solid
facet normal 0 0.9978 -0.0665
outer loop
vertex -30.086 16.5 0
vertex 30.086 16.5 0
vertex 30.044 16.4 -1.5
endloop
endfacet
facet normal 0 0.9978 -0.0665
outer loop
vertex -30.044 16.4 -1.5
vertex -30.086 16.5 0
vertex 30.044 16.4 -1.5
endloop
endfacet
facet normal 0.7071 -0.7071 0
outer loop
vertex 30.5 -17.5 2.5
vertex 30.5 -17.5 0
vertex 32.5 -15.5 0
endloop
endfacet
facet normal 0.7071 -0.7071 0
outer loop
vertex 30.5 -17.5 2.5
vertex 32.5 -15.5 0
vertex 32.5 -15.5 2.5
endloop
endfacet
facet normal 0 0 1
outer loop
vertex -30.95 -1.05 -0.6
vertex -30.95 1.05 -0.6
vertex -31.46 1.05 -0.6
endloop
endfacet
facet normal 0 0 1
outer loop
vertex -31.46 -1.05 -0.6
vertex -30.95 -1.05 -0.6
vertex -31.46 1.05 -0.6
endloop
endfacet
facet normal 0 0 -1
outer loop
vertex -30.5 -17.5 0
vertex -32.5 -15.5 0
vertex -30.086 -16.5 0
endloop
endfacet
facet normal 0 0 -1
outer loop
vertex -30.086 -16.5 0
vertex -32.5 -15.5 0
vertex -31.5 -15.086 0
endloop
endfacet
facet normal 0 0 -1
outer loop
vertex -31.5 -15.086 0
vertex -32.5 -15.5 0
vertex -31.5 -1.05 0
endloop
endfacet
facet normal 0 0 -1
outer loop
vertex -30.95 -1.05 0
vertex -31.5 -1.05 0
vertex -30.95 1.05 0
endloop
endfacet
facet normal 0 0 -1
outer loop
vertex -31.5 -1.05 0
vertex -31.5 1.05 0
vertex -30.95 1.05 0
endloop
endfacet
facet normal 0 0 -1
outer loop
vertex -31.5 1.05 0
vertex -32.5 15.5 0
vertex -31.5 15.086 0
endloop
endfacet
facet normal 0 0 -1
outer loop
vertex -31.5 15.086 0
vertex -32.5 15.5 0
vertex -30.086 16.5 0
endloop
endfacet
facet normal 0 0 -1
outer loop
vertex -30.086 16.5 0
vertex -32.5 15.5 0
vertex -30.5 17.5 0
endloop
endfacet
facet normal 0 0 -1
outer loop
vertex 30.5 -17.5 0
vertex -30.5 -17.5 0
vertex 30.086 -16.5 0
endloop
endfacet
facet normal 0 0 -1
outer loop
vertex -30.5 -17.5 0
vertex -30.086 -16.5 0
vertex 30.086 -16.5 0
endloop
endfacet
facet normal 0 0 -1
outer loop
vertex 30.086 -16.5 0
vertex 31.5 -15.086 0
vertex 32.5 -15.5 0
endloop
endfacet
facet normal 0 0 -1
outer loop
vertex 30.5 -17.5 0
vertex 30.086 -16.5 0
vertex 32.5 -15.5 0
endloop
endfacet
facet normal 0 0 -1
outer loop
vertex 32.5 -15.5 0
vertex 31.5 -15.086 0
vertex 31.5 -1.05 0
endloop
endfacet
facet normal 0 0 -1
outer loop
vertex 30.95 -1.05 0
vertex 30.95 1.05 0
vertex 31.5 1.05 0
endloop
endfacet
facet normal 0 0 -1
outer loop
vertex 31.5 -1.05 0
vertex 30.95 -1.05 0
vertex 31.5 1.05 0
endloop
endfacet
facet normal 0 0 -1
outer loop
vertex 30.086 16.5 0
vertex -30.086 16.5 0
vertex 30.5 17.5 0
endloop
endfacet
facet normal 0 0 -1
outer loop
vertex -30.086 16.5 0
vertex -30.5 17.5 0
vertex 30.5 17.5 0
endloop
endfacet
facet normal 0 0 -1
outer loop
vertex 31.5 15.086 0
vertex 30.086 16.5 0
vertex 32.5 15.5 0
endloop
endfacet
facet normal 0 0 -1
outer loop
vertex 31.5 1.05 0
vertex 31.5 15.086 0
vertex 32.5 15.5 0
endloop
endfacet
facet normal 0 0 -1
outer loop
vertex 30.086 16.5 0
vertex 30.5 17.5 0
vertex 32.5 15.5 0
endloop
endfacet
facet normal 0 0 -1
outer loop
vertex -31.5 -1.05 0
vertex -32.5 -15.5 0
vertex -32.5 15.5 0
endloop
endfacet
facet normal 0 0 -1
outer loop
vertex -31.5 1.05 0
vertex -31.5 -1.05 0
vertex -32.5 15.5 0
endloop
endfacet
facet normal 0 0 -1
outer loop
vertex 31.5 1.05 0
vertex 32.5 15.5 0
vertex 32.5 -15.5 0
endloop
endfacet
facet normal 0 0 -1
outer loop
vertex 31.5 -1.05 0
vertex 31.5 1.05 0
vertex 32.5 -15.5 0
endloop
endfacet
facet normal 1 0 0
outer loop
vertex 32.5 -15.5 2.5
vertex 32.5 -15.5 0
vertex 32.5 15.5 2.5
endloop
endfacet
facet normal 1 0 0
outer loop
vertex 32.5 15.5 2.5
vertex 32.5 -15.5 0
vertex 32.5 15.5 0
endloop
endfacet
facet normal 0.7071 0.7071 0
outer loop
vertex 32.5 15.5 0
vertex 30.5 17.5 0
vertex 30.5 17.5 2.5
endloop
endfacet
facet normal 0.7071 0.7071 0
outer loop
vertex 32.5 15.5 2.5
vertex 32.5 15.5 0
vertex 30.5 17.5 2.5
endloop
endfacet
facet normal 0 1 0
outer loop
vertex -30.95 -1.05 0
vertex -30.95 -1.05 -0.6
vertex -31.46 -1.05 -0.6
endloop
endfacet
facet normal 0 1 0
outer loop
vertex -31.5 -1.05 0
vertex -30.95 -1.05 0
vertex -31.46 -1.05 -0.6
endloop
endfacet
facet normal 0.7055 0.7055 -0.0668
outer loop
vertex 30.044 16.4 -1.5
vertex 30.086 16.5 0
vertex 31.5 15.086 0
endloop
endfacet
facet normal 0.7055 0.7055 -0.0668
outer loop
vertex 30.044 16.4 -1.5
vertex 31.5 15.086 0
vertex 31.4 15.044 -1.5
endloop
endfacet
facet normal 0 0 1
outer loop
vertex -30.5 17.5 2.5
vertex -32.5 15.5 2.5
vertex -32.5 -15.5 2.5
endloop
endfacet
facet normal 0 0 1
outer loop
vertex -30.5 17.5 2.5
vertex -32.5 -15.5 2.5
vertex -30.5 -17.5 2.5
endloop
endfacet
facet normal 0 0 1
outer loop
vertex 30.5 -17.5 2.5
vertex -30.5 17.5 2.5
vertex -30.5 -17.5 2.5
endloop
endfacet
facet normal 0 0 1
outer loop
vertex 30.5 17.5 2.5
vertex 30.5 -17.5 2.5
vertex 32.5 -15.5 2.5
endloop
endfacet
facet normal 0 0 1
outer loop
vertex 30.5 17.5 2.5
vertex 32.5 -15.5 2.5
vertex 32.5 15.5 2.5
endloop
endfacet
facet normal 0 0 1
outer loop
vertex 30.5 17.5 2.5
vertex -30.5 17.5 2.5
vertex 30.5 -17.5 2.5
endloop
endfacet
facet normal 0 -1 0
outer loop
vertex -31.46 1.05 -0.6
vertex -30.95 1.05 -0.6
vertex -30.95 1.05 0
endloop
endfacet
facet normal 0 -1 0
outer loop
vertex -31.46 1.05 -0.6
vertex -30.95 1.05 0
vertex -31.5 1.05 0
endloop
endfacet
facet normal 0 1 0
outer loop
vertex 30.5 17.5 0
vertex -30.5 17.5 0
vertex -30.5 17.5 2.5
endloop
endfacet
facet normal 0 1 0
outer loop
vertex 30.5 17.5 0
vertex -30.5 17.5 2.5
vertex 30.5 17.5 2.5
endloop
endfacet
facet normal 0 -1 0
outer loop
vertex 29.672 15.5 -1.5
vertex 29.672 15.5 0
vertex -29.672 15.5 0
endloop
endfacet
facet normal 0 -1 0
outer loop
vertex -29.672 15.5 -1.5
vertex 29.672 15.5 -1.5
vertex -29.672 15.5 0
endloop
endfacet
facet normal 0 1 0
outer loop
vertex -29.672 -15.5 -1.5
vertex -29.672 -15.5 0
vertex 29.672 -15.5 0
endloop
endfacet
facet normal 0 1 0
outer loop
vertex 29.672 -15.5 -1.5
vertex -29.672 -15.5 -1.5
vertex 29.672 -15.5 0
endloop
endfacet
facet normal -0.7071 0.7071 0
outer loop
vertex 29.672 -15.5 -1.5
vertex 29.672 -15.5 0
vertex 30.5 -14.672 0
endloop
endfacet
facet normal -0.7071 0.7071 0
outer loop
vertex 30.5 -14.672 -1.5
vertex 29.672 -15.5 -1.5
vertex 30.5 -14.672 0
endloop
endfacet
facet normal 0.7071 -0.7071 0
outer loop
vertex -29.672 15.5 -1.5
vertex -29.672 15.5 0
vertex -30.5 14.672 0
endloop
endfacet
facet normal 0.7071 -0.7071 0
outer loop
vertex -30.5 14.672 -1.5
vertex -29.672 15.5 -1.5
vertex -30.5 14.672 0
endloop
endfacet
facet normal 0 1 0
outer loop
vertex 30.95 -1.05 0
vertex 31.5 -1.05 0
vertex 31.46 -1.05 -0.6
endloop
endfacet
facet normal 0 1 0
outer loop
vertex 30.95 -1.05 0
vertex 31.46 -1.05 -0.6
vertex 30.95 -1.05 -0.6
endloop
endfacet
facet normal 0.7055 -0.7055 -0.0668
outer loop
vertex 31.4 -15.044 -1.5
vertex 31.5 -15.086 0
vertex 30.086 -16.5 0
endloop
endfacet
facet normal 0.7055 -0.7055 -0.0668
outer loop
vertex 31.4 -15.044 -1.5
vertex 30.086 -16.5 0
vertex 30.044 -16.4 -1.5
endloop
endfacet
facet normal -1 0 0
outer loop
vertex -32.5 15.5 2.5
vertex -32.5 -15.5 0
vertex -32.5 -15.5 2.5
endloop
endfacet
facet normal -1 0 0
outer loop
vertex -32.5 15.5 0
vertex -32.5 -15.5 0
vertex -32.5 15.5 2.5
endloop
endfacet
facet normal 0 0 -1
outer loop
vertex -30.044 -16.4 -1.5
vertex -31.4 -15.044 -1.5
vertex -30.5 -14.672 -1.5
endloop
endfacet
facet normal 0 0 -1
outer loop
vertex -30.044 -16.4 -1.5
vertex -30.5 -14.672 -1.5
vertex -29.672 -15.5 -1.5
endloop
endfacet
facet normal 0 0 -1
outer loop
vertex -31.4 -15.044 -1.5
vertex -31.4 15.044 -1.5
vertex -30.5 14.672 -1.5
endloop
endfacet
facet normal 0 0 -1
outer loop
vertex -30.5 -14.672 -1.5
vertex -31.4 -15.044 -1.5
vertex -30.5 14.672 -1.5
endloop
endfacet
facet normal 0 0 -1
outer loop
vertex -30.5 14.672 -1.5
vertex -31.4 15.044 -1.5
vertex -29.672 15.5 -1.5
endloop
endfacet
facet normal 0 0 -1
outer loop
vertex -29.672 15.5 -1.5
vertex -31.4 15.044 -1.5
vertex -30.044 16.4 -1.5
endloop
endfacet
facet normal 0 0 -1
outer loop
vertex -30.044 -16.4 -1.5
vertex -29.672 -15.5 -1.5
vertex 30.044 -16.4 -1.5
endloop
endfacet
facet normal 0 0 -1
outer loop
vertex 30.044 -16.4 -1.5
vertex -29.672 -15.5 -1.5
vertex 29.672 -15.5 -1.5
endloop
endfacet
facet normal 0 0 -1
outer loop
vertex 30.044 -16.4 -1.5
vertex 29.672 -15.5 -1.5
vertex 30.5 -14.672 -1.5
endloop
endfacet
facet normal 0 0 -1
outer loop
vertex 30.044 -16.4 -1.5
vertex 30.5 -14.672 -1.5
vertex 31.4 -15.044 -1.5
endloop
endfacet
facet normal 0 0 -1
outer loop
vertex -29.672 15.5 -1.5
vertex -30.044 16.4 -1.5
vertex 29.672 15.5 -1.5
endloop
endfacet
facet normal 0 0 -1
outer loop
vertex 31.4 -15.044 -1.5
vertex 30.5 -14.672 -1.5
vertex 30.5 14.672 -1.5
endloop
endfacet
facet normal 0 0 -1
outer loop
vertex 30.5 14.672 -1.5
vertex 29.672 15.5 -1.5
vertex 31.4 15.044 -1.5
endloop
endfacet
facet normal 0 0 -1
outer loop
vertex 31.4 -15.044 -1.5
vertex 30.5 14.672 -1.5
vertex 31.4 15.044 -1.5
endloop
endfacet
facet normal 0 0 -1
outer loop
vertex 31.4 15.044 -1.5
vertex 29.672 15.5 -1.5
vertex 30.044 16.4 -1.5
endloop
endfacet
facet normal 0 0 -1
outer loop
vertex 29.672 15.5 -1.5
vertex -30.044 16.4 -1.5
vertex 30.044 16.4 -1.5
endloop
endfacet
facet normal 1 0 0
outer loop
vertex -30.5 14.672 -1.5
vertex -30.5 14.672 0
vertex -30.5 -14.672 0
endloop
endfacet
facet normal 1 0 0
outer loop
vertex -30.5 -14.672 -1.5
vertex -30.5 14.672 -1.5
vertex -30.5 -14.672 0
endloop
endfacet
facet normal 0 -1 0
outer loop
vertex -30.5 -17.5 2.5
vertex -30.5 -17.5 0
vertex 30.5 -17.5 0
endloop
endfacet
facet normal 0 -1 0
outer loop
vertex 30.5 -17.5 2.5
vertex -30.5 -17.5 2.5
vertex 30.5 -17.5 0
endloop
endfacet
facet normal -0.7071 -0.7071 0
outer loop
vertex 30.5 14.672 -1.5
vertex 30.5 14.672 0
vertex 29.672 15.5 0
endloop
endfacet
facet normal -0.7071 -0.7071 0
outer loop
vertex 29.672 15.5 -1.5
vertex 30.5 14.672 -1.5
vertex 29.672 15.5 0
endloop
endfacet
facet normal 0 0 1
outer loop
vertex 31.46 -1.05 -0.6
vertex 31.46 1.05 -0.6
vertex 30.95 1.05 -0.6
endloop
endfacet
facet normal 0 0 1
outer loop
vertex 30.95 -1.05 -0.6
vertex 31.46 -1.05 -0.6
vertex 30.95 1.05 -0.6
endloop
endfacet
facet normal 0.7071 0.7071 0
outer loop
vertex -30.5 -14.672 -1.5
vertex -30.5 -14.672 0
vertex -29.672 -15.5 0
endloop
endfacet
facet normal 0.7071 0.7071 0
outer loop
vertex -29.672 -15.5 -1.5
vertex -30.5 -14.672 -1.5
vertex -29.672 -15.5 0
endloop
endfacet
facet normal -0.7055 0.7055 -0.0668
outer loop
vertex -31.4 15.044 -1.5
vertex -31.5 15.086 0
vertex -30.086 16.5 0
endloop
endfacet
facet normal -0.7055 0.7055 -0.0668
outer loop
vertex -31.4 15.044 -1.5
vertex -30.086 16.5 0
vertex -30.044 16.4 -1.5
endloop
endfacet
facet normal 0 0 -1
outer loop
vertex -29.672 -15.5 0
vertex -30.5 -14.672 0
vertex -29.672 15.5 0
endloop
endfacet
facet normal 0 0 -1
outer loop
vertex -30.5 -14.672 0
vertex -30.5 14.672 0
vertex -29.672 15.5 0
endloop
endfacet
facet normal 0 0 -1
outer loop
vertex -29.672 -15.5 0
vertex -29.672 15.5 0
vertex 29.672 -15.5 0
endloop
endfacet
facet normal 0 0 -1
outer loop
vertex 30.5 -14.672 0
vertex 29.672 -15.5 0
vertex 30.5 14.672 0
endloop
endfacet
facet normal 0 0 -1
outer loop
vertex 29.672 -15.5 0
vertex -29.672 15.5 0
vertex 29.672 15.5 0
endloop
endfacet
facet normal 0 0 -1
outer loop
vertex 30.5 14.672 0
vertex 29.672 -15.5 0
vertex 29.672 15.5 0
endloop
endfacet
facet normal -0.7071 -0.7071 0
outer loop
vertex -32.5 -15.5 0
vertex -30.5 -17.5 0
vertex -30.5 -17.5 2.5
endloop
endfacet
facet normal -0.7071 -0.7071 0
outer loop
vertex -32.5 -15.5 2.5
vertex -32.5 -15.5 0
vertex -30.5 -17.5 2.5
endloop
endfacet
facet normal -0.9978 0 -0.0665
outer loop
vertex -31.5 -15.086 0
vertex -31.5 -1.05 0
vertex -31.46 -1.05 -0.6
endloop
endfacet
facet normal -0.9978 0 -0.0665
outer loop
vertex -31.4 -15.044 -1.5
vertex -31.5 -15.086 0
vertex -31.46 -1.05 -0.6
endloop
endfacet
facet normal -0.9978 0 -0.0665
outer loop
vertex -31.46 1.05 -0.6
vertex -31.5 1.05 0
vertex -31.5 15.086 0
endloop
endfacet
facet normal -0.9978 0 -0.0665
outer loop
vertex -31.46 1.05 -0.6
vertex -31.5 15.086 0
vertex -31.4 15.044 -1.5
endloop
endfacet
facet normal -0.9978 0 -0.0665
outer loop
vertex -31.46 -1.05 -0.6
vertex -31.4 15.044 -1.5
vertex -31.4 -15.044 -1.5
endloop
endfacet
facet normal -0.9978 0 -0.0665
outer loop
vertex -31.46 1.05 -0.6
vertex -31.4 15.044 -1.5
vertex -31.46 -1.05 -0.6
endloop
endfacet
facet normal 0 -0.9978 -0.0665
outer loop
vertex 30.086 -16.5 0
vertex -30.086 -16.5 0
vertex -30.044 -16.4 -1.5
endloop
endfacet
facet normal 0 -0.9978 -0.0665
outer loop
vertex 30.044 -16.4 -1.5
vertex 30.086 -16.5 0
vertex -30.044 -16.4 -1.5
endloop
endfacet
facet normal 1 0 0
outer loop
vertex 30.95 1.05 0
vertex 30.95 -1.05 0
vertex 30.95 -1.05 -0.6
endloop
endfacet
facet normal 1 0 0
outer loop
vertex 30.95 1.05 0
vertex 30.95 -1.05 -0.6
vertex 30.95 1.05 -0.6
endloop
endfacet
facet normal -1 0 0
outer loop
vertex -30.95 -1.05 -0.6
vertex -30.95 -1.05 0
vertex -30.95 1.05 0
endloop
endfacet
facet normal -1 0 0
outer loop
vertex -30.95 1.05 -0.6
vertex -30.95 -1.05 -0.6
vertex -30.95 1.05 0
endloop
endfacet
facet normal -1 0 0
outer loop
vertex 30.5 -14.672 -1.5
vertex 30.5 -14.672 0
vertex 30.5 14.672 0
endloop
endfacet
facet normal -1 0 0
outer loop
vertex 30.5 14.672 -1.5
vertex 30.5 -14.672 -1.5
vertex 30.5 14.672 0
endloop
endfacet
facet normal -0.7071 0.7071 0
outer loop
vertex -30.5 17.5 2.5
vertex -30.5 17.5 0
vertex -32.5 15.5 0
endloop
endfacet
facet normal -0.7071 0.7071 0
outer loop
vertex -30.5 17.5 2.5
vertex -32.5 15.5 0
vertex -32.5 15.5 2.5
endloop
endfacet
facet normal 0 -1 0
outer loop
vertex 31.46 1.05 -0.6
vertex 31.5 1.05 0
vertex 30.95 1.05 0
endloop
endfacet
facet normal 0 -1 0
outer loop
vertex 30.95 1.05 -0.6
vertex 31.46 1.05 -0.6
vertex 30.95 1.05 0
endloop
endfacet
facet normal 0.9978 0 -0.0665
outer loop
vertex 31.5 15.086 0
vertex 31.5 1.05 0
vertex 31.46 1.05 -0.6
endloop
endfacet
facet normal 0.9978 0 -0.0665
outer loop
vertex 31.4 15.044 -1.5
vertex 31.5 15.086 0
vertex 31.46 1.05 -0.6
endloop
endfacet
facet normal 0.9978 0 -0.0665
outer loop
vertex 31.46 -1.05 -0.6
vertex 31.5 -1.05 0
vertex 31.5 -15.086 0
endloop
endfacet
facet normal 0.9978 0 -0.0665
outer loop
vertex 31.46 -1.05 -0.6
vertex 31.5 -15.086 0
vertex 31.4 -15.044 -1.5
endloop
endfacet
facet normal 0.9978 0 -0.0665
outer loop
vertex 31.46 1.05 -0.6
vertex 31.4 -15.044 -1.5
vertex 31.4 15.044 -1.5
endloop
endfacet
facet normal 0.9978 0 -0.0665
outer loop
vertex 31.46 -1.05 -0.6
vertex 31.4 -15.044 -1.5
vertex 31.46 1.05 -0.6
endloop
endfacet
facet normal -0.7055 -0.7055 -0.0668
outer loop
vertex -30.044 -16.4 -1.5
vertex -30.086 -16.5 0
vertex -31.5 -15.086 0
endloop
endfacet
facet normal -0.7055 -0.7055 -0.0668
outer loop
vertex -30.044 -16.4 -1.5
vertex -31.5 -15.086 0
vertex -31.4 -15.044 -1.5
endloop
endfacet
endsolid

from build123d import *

# Parameters (mm, degrees)
CROQUIS1_W              = 65
CROQUIS1_H              = 35
SALIENTE_EXTRUIR1_DEPTH = 2.5
CHAMFER1_SIZE           = 2
BOSS_EXTRUDE1_START     = -2.5
BOSS_EXTRUDE1_DEPTH     = 1.5
CHAMFER2_SIZE           = 1.5
CHAMFER2_SIZE_2         = 0.1
SKETCH2_W               = 1.1
SKETCH2_H               = 2.1
CUT_EXTRUDE1_DEPTH      = 0.6


with BuildPart() as part:
    # Croquis1 → Saliente-Extruir1 (new body)
    with BuildSketch(Plane.XY):
        Rectangle(CROQUIS1_W, CROQUIS1_H)
    extrude(amount=SALIENTE_EXTRUIR1_DEPTH)

    # Chamfer1
    chamfer1_edges = [part.edges().sort_by_distance(p)[0] for p in [
        (-32.5, 17.5, 1.25),
        (-32.5, -17.5, 1.25),
        (32.5, -17.5, 1.25),
        (32.5, 17.5, 1.25),
    ]]
    chamfer(chamfer1_edges, length=CHAMFER1_SIZE)

    # Sketch1 → Boss-Extrude1 (add)
    with BuildSketch(Plane.XY.offset(2.5).offset(BOSS_EXTRUDE1_START)):
        Polygon((-30.085786438, -16.5), (30.085786438, -16.5), (31.5, -15.085786438), (31.5, 15.085786438), (30.085786438, 16.5), (-30.085786438, 16.5), (-31.5, 15.085786438), (-31.5, -15.085786438), align=None)
        Polygon((-29.671572875, -15.5), (29.671572875, -15.5), (30.5, -14.671572875), (30.5, 14.671572875), (29.671572875, 15.5), (-29.671572875, 15.5), (-30.5, 14.671572875), (-30.5, -14.671572875), align=None, mode=Mode.SUBTRACT)
    extrude(amount=-BOSS_EXTRUDE1_DEPTH)

    # Chamfer2
    # the kernel refuses this chamfer: 1.5, 0.1 mm, written as the material it takes off along each edge
    with BuildSketch(Plane(origin=(34.257490553, 12.328295884, -1.5), x_dir=(0.0018092267925963327, 0.001809226792596321, 0.9999967266930556), z_dir=(-0.7071067811865454, 0.7071067811865498, 0))) as chamfer2_piece_1_section:
        Polygon((CHAMFER2_SIZE * 0.999996726693, -CHAMFER2_SIZE * 0.0025586330675), (-CHAMFER2_SIZE_2 * 0.0025586330675, -CHAMFER2_SIZE_2 * 0.999996726693), (0, 0), align=None)
    chamfer2_piece_1 = extrude(amount=9.799361077, mode=Mode.PRIVATE)
    chamfer2_piece_1 = split(chamfer2_piece_1, bisect_by=Plane(origin=(30.78142094, 15.78142094, 0), z_dir=(0, 0, -1)), keep=Keep.TOP, mode=Mode.PRIVATE)
    add(chamfer2_piece_1, mode=Mode.SUBTRACT)
    with BuildSketch(Plane(origin=(33.985466976, 16.5, -1.5), x_dir=(0, 0.0025586330674999794, 0.9999967266930556), z_dir=(-1, 0, 0))) as chamfer2_piece_2_section:
        Polygon((CHAMFER2_SIZE * 0.999996726693, -CHAMFER2_SIZE * 0.0025586330675), (-CHAMFER2_SIZE_2 * 0.0025586330675, -CHAMFER2_SIZE_2 * 0.999996726693), (0, 0), align=None)
    chamfer2_piece_2 = extrude(amount=67.970933952, mode=Mode.PRIVATE)
    chamfer2_piece_2 = split(chamfer2_piece_2, bisect_by=Plane(origin=(0, 16.483775747, 0), z_dir=(0, 0, -1)), keep=Keep.TOP, mode=Mode.PRIVATE)
    add(chamfer2_piece_2, mode=Mode.SUBTRACT)
    with BuildSketch(Plane(origin=(-27.328295884, 19.257490553, -1.5), x_dir=(-0.0018092267925980316, 0.0018092267925980384, 0.9999967266930556), z_dir=(-0.7071067811865489, -0.7071067811865462, 0))) as chamfer2_piece_3_section:
        Polygon((CHAMFER2_SIZE * 0.999996726693, -CHAMFER2_SIZE * 0.0025586330675), (-CHAMFER2_SIZE_2 * 0.0025586330675, -CHAMFER2_SIZE_2 * 0.999996726693), (0, 0), align=None)
    chamfer2_piece_3 = extrude(amount=9.799361077, mode=Mode.PRIVATE)
    chamfer2_piece_3 = split(chamfer2_piece_3, bisect_by=Plane(origin=(-30.78142094, 15.78142094, 0), z_dir=(0, 0, -1)), keep=Keep.TOP, mode=Mode.PRIVATE)
    add(chamfer2_piece_3, mode=Mode.SUBTRACT)
    with BuildSketch(Plane(origin=(-31.5, 18.985466976, -1.5), x_dir=(-0.0025586330674999794, 0, 0.9999967266930556), z_dir=(0, -1, 0))) as chamfer2_piece_4_section:
        Polygon((CHAMFER2_SIZE * 0.999996726693, -CHAMFER2_SIZE * 0.0025586330675), (-CHAMFER2_SIZE_2 * 0.0025586330675, -CHAMFER2_SIZE_2 * 0.999996726693), (0, 0), align=None)
    chamfer2_piece_4 = extrude(amount=37.970933952, mode=Mode.PRIVATE)
    chamfer2_piece_4 = split(chamfer2_piece_4, bisect_by=Plane(origin=(-31.483775747, 0, 0), z_dir=(0, 0, -1)), keep=Keep.TOP, mode=Mode.PRIVATE)
    add(chamfer2_piece_4, mode=Mode.SUBTRACT)
    with BuildSketch(Plane(origin=(-34.257490553, -12.328295884, -1.5), x_dir=(-0.0018092267925951928, -0.0018092267925951832, 0.9999967266930556), z_dir=(0.7071067811865458, -0.7071067811865493, 0))) as chamfer2_piece_5_section:
        Polygon((CHAMFER2_SIZE * 0.999996726693, -CHAMFER2_SIZE * 0.0025586330675), (-CHAMFER2_SIZE_2 * 0.0025586330675, -CHAMFER2_SIZE_2 * 0.999996726693), (0, 0), align=None)
    chamfer2_piece_5 = extrude(amount=9.799361077, mode=Mode.PRIVATE)
    chamfer2_piece_5 = split(chamfer2_piece_5, bisect_by=Plane(origin=(-30.78142094, -15.78142094, 0), z_dir=(0, 0, -1)), keep=Keep.TOP, mode=Mode.PRIVATE)
    add(chamfer2_piece_5, mode=Mode.SUBTRACT)
    with BuildSketch(Plane(origin=(31.5, -18.985466976, -1.5), x_dir=(0.0025586330674999794, 0, 0.9999967266930556), z_dir=(0, 1, 0))) as chamfer2_piece_6_section:
        Polygon((CHAMFER2_SIZE * 0.999996726693, -CHAMFER2_SIZE * 0.0025586330675), (-CHAMFER2_SIZE_2 * 0.0025586330675, -CHAMFER2_SIZE_2 * 0.999996726693), (0, 0), align=None)
    chamfer2_piece_6 = extrude(amount=37.970933952, mode=Mode.PRIVATE)
    chamfer2_piece_6 = split(chamfer2_piece_6, bisect_by=Plane(origin=(31.483775747, 0, 0), z_dir=(0, 0, -1)), keep=Keep.TOP, mode=Mode.PRIVATE)
    add(chamfer2_piece_6, mode=Mode.SUBTRACT)
    with BuildSketch(Plane(origin=(27.328295884, -19.257490553, -1.5), x_dir=(0.0018092267925980349, -0.0018092267925980349, 0.9999967266930556), z_dir=(0.7071067811865476, 0.7071067811865476, 0))) as chamfer2_piece_7_section:
        Polygon((CHAMFER2_SIZE * 0.999996726693, -CHAMFER2_SIZE * 0.0025586330675), (-CHAMFER2_SIZE_2 * 0.0025586330675, -CHAMFER2_SIZE_2 * 0.999996726693), (0, 0), align=None)
    chamfer2_piece_7 = extrude(amount=9.799361077, mode=Mode.PRIVATE)
    chamfer2_piece_7 = split(chamfer2_piece_7, bisect_by=Plane(origin=(30.78142094, -15.78142094, 0), z_dir=(0, 0, -1)), keep=Keep.TOP, mode=Mode.PRIVATE)
    add(chamfer2_piece_7, mode=Mode.SUBTRACT)
    with BuildSketch(Plane(origin=(-33.985466976, -16.5, -1.5), x_dir=(0, -0.0025586330674999794, 0.9999967266930556), z_dir=(1, 0, 0))) as chamfer2_piece_8_section:
        Polygon((CHAMFER2_SIZE * 0.999996726693, -CHAMFER2_SIZE * 0.0025586330675), (-CHAMFER2_SIZE_2 * 0.0025586330675, -CHAMFER2_SIZE_2 * 0.999996726693), (0, 0), align=None)
    chamfer2_piece_8 = extrude(amount=67.970933952, mode=Mode.PRIVATE)
    chamfer2_piece_8 = split(chamfer2_piece_8, bisect_by=Plane(origin=(0, -16.483775747, 0), z_dir=(0, 0, -1)), keep=Keep.TOP, mode=Mode.PRIVATE)
    add(chamfer2_piece_8, mode=Mode.SUBTRACT)

    # Sketch2 → Cut-Extrude1 (cut)
    with BuildSketch(Plane(origin=(0, 0, 0), x_dir=(-1, 0, 0), z_dir=(0, 0, -1))):
        with Locations((-31.5, 0)):
            Rectangle(SKETCH2_W, SKETCH2_H)
        with Locations((31.5, 0)):
            Rectangle(SKETCH2_W, SKETCH2_H)
    extrude(amount=CUT_EXTRUDE1_DEPTH, mode=Mode.SUBTRACT)


solid = part.part
